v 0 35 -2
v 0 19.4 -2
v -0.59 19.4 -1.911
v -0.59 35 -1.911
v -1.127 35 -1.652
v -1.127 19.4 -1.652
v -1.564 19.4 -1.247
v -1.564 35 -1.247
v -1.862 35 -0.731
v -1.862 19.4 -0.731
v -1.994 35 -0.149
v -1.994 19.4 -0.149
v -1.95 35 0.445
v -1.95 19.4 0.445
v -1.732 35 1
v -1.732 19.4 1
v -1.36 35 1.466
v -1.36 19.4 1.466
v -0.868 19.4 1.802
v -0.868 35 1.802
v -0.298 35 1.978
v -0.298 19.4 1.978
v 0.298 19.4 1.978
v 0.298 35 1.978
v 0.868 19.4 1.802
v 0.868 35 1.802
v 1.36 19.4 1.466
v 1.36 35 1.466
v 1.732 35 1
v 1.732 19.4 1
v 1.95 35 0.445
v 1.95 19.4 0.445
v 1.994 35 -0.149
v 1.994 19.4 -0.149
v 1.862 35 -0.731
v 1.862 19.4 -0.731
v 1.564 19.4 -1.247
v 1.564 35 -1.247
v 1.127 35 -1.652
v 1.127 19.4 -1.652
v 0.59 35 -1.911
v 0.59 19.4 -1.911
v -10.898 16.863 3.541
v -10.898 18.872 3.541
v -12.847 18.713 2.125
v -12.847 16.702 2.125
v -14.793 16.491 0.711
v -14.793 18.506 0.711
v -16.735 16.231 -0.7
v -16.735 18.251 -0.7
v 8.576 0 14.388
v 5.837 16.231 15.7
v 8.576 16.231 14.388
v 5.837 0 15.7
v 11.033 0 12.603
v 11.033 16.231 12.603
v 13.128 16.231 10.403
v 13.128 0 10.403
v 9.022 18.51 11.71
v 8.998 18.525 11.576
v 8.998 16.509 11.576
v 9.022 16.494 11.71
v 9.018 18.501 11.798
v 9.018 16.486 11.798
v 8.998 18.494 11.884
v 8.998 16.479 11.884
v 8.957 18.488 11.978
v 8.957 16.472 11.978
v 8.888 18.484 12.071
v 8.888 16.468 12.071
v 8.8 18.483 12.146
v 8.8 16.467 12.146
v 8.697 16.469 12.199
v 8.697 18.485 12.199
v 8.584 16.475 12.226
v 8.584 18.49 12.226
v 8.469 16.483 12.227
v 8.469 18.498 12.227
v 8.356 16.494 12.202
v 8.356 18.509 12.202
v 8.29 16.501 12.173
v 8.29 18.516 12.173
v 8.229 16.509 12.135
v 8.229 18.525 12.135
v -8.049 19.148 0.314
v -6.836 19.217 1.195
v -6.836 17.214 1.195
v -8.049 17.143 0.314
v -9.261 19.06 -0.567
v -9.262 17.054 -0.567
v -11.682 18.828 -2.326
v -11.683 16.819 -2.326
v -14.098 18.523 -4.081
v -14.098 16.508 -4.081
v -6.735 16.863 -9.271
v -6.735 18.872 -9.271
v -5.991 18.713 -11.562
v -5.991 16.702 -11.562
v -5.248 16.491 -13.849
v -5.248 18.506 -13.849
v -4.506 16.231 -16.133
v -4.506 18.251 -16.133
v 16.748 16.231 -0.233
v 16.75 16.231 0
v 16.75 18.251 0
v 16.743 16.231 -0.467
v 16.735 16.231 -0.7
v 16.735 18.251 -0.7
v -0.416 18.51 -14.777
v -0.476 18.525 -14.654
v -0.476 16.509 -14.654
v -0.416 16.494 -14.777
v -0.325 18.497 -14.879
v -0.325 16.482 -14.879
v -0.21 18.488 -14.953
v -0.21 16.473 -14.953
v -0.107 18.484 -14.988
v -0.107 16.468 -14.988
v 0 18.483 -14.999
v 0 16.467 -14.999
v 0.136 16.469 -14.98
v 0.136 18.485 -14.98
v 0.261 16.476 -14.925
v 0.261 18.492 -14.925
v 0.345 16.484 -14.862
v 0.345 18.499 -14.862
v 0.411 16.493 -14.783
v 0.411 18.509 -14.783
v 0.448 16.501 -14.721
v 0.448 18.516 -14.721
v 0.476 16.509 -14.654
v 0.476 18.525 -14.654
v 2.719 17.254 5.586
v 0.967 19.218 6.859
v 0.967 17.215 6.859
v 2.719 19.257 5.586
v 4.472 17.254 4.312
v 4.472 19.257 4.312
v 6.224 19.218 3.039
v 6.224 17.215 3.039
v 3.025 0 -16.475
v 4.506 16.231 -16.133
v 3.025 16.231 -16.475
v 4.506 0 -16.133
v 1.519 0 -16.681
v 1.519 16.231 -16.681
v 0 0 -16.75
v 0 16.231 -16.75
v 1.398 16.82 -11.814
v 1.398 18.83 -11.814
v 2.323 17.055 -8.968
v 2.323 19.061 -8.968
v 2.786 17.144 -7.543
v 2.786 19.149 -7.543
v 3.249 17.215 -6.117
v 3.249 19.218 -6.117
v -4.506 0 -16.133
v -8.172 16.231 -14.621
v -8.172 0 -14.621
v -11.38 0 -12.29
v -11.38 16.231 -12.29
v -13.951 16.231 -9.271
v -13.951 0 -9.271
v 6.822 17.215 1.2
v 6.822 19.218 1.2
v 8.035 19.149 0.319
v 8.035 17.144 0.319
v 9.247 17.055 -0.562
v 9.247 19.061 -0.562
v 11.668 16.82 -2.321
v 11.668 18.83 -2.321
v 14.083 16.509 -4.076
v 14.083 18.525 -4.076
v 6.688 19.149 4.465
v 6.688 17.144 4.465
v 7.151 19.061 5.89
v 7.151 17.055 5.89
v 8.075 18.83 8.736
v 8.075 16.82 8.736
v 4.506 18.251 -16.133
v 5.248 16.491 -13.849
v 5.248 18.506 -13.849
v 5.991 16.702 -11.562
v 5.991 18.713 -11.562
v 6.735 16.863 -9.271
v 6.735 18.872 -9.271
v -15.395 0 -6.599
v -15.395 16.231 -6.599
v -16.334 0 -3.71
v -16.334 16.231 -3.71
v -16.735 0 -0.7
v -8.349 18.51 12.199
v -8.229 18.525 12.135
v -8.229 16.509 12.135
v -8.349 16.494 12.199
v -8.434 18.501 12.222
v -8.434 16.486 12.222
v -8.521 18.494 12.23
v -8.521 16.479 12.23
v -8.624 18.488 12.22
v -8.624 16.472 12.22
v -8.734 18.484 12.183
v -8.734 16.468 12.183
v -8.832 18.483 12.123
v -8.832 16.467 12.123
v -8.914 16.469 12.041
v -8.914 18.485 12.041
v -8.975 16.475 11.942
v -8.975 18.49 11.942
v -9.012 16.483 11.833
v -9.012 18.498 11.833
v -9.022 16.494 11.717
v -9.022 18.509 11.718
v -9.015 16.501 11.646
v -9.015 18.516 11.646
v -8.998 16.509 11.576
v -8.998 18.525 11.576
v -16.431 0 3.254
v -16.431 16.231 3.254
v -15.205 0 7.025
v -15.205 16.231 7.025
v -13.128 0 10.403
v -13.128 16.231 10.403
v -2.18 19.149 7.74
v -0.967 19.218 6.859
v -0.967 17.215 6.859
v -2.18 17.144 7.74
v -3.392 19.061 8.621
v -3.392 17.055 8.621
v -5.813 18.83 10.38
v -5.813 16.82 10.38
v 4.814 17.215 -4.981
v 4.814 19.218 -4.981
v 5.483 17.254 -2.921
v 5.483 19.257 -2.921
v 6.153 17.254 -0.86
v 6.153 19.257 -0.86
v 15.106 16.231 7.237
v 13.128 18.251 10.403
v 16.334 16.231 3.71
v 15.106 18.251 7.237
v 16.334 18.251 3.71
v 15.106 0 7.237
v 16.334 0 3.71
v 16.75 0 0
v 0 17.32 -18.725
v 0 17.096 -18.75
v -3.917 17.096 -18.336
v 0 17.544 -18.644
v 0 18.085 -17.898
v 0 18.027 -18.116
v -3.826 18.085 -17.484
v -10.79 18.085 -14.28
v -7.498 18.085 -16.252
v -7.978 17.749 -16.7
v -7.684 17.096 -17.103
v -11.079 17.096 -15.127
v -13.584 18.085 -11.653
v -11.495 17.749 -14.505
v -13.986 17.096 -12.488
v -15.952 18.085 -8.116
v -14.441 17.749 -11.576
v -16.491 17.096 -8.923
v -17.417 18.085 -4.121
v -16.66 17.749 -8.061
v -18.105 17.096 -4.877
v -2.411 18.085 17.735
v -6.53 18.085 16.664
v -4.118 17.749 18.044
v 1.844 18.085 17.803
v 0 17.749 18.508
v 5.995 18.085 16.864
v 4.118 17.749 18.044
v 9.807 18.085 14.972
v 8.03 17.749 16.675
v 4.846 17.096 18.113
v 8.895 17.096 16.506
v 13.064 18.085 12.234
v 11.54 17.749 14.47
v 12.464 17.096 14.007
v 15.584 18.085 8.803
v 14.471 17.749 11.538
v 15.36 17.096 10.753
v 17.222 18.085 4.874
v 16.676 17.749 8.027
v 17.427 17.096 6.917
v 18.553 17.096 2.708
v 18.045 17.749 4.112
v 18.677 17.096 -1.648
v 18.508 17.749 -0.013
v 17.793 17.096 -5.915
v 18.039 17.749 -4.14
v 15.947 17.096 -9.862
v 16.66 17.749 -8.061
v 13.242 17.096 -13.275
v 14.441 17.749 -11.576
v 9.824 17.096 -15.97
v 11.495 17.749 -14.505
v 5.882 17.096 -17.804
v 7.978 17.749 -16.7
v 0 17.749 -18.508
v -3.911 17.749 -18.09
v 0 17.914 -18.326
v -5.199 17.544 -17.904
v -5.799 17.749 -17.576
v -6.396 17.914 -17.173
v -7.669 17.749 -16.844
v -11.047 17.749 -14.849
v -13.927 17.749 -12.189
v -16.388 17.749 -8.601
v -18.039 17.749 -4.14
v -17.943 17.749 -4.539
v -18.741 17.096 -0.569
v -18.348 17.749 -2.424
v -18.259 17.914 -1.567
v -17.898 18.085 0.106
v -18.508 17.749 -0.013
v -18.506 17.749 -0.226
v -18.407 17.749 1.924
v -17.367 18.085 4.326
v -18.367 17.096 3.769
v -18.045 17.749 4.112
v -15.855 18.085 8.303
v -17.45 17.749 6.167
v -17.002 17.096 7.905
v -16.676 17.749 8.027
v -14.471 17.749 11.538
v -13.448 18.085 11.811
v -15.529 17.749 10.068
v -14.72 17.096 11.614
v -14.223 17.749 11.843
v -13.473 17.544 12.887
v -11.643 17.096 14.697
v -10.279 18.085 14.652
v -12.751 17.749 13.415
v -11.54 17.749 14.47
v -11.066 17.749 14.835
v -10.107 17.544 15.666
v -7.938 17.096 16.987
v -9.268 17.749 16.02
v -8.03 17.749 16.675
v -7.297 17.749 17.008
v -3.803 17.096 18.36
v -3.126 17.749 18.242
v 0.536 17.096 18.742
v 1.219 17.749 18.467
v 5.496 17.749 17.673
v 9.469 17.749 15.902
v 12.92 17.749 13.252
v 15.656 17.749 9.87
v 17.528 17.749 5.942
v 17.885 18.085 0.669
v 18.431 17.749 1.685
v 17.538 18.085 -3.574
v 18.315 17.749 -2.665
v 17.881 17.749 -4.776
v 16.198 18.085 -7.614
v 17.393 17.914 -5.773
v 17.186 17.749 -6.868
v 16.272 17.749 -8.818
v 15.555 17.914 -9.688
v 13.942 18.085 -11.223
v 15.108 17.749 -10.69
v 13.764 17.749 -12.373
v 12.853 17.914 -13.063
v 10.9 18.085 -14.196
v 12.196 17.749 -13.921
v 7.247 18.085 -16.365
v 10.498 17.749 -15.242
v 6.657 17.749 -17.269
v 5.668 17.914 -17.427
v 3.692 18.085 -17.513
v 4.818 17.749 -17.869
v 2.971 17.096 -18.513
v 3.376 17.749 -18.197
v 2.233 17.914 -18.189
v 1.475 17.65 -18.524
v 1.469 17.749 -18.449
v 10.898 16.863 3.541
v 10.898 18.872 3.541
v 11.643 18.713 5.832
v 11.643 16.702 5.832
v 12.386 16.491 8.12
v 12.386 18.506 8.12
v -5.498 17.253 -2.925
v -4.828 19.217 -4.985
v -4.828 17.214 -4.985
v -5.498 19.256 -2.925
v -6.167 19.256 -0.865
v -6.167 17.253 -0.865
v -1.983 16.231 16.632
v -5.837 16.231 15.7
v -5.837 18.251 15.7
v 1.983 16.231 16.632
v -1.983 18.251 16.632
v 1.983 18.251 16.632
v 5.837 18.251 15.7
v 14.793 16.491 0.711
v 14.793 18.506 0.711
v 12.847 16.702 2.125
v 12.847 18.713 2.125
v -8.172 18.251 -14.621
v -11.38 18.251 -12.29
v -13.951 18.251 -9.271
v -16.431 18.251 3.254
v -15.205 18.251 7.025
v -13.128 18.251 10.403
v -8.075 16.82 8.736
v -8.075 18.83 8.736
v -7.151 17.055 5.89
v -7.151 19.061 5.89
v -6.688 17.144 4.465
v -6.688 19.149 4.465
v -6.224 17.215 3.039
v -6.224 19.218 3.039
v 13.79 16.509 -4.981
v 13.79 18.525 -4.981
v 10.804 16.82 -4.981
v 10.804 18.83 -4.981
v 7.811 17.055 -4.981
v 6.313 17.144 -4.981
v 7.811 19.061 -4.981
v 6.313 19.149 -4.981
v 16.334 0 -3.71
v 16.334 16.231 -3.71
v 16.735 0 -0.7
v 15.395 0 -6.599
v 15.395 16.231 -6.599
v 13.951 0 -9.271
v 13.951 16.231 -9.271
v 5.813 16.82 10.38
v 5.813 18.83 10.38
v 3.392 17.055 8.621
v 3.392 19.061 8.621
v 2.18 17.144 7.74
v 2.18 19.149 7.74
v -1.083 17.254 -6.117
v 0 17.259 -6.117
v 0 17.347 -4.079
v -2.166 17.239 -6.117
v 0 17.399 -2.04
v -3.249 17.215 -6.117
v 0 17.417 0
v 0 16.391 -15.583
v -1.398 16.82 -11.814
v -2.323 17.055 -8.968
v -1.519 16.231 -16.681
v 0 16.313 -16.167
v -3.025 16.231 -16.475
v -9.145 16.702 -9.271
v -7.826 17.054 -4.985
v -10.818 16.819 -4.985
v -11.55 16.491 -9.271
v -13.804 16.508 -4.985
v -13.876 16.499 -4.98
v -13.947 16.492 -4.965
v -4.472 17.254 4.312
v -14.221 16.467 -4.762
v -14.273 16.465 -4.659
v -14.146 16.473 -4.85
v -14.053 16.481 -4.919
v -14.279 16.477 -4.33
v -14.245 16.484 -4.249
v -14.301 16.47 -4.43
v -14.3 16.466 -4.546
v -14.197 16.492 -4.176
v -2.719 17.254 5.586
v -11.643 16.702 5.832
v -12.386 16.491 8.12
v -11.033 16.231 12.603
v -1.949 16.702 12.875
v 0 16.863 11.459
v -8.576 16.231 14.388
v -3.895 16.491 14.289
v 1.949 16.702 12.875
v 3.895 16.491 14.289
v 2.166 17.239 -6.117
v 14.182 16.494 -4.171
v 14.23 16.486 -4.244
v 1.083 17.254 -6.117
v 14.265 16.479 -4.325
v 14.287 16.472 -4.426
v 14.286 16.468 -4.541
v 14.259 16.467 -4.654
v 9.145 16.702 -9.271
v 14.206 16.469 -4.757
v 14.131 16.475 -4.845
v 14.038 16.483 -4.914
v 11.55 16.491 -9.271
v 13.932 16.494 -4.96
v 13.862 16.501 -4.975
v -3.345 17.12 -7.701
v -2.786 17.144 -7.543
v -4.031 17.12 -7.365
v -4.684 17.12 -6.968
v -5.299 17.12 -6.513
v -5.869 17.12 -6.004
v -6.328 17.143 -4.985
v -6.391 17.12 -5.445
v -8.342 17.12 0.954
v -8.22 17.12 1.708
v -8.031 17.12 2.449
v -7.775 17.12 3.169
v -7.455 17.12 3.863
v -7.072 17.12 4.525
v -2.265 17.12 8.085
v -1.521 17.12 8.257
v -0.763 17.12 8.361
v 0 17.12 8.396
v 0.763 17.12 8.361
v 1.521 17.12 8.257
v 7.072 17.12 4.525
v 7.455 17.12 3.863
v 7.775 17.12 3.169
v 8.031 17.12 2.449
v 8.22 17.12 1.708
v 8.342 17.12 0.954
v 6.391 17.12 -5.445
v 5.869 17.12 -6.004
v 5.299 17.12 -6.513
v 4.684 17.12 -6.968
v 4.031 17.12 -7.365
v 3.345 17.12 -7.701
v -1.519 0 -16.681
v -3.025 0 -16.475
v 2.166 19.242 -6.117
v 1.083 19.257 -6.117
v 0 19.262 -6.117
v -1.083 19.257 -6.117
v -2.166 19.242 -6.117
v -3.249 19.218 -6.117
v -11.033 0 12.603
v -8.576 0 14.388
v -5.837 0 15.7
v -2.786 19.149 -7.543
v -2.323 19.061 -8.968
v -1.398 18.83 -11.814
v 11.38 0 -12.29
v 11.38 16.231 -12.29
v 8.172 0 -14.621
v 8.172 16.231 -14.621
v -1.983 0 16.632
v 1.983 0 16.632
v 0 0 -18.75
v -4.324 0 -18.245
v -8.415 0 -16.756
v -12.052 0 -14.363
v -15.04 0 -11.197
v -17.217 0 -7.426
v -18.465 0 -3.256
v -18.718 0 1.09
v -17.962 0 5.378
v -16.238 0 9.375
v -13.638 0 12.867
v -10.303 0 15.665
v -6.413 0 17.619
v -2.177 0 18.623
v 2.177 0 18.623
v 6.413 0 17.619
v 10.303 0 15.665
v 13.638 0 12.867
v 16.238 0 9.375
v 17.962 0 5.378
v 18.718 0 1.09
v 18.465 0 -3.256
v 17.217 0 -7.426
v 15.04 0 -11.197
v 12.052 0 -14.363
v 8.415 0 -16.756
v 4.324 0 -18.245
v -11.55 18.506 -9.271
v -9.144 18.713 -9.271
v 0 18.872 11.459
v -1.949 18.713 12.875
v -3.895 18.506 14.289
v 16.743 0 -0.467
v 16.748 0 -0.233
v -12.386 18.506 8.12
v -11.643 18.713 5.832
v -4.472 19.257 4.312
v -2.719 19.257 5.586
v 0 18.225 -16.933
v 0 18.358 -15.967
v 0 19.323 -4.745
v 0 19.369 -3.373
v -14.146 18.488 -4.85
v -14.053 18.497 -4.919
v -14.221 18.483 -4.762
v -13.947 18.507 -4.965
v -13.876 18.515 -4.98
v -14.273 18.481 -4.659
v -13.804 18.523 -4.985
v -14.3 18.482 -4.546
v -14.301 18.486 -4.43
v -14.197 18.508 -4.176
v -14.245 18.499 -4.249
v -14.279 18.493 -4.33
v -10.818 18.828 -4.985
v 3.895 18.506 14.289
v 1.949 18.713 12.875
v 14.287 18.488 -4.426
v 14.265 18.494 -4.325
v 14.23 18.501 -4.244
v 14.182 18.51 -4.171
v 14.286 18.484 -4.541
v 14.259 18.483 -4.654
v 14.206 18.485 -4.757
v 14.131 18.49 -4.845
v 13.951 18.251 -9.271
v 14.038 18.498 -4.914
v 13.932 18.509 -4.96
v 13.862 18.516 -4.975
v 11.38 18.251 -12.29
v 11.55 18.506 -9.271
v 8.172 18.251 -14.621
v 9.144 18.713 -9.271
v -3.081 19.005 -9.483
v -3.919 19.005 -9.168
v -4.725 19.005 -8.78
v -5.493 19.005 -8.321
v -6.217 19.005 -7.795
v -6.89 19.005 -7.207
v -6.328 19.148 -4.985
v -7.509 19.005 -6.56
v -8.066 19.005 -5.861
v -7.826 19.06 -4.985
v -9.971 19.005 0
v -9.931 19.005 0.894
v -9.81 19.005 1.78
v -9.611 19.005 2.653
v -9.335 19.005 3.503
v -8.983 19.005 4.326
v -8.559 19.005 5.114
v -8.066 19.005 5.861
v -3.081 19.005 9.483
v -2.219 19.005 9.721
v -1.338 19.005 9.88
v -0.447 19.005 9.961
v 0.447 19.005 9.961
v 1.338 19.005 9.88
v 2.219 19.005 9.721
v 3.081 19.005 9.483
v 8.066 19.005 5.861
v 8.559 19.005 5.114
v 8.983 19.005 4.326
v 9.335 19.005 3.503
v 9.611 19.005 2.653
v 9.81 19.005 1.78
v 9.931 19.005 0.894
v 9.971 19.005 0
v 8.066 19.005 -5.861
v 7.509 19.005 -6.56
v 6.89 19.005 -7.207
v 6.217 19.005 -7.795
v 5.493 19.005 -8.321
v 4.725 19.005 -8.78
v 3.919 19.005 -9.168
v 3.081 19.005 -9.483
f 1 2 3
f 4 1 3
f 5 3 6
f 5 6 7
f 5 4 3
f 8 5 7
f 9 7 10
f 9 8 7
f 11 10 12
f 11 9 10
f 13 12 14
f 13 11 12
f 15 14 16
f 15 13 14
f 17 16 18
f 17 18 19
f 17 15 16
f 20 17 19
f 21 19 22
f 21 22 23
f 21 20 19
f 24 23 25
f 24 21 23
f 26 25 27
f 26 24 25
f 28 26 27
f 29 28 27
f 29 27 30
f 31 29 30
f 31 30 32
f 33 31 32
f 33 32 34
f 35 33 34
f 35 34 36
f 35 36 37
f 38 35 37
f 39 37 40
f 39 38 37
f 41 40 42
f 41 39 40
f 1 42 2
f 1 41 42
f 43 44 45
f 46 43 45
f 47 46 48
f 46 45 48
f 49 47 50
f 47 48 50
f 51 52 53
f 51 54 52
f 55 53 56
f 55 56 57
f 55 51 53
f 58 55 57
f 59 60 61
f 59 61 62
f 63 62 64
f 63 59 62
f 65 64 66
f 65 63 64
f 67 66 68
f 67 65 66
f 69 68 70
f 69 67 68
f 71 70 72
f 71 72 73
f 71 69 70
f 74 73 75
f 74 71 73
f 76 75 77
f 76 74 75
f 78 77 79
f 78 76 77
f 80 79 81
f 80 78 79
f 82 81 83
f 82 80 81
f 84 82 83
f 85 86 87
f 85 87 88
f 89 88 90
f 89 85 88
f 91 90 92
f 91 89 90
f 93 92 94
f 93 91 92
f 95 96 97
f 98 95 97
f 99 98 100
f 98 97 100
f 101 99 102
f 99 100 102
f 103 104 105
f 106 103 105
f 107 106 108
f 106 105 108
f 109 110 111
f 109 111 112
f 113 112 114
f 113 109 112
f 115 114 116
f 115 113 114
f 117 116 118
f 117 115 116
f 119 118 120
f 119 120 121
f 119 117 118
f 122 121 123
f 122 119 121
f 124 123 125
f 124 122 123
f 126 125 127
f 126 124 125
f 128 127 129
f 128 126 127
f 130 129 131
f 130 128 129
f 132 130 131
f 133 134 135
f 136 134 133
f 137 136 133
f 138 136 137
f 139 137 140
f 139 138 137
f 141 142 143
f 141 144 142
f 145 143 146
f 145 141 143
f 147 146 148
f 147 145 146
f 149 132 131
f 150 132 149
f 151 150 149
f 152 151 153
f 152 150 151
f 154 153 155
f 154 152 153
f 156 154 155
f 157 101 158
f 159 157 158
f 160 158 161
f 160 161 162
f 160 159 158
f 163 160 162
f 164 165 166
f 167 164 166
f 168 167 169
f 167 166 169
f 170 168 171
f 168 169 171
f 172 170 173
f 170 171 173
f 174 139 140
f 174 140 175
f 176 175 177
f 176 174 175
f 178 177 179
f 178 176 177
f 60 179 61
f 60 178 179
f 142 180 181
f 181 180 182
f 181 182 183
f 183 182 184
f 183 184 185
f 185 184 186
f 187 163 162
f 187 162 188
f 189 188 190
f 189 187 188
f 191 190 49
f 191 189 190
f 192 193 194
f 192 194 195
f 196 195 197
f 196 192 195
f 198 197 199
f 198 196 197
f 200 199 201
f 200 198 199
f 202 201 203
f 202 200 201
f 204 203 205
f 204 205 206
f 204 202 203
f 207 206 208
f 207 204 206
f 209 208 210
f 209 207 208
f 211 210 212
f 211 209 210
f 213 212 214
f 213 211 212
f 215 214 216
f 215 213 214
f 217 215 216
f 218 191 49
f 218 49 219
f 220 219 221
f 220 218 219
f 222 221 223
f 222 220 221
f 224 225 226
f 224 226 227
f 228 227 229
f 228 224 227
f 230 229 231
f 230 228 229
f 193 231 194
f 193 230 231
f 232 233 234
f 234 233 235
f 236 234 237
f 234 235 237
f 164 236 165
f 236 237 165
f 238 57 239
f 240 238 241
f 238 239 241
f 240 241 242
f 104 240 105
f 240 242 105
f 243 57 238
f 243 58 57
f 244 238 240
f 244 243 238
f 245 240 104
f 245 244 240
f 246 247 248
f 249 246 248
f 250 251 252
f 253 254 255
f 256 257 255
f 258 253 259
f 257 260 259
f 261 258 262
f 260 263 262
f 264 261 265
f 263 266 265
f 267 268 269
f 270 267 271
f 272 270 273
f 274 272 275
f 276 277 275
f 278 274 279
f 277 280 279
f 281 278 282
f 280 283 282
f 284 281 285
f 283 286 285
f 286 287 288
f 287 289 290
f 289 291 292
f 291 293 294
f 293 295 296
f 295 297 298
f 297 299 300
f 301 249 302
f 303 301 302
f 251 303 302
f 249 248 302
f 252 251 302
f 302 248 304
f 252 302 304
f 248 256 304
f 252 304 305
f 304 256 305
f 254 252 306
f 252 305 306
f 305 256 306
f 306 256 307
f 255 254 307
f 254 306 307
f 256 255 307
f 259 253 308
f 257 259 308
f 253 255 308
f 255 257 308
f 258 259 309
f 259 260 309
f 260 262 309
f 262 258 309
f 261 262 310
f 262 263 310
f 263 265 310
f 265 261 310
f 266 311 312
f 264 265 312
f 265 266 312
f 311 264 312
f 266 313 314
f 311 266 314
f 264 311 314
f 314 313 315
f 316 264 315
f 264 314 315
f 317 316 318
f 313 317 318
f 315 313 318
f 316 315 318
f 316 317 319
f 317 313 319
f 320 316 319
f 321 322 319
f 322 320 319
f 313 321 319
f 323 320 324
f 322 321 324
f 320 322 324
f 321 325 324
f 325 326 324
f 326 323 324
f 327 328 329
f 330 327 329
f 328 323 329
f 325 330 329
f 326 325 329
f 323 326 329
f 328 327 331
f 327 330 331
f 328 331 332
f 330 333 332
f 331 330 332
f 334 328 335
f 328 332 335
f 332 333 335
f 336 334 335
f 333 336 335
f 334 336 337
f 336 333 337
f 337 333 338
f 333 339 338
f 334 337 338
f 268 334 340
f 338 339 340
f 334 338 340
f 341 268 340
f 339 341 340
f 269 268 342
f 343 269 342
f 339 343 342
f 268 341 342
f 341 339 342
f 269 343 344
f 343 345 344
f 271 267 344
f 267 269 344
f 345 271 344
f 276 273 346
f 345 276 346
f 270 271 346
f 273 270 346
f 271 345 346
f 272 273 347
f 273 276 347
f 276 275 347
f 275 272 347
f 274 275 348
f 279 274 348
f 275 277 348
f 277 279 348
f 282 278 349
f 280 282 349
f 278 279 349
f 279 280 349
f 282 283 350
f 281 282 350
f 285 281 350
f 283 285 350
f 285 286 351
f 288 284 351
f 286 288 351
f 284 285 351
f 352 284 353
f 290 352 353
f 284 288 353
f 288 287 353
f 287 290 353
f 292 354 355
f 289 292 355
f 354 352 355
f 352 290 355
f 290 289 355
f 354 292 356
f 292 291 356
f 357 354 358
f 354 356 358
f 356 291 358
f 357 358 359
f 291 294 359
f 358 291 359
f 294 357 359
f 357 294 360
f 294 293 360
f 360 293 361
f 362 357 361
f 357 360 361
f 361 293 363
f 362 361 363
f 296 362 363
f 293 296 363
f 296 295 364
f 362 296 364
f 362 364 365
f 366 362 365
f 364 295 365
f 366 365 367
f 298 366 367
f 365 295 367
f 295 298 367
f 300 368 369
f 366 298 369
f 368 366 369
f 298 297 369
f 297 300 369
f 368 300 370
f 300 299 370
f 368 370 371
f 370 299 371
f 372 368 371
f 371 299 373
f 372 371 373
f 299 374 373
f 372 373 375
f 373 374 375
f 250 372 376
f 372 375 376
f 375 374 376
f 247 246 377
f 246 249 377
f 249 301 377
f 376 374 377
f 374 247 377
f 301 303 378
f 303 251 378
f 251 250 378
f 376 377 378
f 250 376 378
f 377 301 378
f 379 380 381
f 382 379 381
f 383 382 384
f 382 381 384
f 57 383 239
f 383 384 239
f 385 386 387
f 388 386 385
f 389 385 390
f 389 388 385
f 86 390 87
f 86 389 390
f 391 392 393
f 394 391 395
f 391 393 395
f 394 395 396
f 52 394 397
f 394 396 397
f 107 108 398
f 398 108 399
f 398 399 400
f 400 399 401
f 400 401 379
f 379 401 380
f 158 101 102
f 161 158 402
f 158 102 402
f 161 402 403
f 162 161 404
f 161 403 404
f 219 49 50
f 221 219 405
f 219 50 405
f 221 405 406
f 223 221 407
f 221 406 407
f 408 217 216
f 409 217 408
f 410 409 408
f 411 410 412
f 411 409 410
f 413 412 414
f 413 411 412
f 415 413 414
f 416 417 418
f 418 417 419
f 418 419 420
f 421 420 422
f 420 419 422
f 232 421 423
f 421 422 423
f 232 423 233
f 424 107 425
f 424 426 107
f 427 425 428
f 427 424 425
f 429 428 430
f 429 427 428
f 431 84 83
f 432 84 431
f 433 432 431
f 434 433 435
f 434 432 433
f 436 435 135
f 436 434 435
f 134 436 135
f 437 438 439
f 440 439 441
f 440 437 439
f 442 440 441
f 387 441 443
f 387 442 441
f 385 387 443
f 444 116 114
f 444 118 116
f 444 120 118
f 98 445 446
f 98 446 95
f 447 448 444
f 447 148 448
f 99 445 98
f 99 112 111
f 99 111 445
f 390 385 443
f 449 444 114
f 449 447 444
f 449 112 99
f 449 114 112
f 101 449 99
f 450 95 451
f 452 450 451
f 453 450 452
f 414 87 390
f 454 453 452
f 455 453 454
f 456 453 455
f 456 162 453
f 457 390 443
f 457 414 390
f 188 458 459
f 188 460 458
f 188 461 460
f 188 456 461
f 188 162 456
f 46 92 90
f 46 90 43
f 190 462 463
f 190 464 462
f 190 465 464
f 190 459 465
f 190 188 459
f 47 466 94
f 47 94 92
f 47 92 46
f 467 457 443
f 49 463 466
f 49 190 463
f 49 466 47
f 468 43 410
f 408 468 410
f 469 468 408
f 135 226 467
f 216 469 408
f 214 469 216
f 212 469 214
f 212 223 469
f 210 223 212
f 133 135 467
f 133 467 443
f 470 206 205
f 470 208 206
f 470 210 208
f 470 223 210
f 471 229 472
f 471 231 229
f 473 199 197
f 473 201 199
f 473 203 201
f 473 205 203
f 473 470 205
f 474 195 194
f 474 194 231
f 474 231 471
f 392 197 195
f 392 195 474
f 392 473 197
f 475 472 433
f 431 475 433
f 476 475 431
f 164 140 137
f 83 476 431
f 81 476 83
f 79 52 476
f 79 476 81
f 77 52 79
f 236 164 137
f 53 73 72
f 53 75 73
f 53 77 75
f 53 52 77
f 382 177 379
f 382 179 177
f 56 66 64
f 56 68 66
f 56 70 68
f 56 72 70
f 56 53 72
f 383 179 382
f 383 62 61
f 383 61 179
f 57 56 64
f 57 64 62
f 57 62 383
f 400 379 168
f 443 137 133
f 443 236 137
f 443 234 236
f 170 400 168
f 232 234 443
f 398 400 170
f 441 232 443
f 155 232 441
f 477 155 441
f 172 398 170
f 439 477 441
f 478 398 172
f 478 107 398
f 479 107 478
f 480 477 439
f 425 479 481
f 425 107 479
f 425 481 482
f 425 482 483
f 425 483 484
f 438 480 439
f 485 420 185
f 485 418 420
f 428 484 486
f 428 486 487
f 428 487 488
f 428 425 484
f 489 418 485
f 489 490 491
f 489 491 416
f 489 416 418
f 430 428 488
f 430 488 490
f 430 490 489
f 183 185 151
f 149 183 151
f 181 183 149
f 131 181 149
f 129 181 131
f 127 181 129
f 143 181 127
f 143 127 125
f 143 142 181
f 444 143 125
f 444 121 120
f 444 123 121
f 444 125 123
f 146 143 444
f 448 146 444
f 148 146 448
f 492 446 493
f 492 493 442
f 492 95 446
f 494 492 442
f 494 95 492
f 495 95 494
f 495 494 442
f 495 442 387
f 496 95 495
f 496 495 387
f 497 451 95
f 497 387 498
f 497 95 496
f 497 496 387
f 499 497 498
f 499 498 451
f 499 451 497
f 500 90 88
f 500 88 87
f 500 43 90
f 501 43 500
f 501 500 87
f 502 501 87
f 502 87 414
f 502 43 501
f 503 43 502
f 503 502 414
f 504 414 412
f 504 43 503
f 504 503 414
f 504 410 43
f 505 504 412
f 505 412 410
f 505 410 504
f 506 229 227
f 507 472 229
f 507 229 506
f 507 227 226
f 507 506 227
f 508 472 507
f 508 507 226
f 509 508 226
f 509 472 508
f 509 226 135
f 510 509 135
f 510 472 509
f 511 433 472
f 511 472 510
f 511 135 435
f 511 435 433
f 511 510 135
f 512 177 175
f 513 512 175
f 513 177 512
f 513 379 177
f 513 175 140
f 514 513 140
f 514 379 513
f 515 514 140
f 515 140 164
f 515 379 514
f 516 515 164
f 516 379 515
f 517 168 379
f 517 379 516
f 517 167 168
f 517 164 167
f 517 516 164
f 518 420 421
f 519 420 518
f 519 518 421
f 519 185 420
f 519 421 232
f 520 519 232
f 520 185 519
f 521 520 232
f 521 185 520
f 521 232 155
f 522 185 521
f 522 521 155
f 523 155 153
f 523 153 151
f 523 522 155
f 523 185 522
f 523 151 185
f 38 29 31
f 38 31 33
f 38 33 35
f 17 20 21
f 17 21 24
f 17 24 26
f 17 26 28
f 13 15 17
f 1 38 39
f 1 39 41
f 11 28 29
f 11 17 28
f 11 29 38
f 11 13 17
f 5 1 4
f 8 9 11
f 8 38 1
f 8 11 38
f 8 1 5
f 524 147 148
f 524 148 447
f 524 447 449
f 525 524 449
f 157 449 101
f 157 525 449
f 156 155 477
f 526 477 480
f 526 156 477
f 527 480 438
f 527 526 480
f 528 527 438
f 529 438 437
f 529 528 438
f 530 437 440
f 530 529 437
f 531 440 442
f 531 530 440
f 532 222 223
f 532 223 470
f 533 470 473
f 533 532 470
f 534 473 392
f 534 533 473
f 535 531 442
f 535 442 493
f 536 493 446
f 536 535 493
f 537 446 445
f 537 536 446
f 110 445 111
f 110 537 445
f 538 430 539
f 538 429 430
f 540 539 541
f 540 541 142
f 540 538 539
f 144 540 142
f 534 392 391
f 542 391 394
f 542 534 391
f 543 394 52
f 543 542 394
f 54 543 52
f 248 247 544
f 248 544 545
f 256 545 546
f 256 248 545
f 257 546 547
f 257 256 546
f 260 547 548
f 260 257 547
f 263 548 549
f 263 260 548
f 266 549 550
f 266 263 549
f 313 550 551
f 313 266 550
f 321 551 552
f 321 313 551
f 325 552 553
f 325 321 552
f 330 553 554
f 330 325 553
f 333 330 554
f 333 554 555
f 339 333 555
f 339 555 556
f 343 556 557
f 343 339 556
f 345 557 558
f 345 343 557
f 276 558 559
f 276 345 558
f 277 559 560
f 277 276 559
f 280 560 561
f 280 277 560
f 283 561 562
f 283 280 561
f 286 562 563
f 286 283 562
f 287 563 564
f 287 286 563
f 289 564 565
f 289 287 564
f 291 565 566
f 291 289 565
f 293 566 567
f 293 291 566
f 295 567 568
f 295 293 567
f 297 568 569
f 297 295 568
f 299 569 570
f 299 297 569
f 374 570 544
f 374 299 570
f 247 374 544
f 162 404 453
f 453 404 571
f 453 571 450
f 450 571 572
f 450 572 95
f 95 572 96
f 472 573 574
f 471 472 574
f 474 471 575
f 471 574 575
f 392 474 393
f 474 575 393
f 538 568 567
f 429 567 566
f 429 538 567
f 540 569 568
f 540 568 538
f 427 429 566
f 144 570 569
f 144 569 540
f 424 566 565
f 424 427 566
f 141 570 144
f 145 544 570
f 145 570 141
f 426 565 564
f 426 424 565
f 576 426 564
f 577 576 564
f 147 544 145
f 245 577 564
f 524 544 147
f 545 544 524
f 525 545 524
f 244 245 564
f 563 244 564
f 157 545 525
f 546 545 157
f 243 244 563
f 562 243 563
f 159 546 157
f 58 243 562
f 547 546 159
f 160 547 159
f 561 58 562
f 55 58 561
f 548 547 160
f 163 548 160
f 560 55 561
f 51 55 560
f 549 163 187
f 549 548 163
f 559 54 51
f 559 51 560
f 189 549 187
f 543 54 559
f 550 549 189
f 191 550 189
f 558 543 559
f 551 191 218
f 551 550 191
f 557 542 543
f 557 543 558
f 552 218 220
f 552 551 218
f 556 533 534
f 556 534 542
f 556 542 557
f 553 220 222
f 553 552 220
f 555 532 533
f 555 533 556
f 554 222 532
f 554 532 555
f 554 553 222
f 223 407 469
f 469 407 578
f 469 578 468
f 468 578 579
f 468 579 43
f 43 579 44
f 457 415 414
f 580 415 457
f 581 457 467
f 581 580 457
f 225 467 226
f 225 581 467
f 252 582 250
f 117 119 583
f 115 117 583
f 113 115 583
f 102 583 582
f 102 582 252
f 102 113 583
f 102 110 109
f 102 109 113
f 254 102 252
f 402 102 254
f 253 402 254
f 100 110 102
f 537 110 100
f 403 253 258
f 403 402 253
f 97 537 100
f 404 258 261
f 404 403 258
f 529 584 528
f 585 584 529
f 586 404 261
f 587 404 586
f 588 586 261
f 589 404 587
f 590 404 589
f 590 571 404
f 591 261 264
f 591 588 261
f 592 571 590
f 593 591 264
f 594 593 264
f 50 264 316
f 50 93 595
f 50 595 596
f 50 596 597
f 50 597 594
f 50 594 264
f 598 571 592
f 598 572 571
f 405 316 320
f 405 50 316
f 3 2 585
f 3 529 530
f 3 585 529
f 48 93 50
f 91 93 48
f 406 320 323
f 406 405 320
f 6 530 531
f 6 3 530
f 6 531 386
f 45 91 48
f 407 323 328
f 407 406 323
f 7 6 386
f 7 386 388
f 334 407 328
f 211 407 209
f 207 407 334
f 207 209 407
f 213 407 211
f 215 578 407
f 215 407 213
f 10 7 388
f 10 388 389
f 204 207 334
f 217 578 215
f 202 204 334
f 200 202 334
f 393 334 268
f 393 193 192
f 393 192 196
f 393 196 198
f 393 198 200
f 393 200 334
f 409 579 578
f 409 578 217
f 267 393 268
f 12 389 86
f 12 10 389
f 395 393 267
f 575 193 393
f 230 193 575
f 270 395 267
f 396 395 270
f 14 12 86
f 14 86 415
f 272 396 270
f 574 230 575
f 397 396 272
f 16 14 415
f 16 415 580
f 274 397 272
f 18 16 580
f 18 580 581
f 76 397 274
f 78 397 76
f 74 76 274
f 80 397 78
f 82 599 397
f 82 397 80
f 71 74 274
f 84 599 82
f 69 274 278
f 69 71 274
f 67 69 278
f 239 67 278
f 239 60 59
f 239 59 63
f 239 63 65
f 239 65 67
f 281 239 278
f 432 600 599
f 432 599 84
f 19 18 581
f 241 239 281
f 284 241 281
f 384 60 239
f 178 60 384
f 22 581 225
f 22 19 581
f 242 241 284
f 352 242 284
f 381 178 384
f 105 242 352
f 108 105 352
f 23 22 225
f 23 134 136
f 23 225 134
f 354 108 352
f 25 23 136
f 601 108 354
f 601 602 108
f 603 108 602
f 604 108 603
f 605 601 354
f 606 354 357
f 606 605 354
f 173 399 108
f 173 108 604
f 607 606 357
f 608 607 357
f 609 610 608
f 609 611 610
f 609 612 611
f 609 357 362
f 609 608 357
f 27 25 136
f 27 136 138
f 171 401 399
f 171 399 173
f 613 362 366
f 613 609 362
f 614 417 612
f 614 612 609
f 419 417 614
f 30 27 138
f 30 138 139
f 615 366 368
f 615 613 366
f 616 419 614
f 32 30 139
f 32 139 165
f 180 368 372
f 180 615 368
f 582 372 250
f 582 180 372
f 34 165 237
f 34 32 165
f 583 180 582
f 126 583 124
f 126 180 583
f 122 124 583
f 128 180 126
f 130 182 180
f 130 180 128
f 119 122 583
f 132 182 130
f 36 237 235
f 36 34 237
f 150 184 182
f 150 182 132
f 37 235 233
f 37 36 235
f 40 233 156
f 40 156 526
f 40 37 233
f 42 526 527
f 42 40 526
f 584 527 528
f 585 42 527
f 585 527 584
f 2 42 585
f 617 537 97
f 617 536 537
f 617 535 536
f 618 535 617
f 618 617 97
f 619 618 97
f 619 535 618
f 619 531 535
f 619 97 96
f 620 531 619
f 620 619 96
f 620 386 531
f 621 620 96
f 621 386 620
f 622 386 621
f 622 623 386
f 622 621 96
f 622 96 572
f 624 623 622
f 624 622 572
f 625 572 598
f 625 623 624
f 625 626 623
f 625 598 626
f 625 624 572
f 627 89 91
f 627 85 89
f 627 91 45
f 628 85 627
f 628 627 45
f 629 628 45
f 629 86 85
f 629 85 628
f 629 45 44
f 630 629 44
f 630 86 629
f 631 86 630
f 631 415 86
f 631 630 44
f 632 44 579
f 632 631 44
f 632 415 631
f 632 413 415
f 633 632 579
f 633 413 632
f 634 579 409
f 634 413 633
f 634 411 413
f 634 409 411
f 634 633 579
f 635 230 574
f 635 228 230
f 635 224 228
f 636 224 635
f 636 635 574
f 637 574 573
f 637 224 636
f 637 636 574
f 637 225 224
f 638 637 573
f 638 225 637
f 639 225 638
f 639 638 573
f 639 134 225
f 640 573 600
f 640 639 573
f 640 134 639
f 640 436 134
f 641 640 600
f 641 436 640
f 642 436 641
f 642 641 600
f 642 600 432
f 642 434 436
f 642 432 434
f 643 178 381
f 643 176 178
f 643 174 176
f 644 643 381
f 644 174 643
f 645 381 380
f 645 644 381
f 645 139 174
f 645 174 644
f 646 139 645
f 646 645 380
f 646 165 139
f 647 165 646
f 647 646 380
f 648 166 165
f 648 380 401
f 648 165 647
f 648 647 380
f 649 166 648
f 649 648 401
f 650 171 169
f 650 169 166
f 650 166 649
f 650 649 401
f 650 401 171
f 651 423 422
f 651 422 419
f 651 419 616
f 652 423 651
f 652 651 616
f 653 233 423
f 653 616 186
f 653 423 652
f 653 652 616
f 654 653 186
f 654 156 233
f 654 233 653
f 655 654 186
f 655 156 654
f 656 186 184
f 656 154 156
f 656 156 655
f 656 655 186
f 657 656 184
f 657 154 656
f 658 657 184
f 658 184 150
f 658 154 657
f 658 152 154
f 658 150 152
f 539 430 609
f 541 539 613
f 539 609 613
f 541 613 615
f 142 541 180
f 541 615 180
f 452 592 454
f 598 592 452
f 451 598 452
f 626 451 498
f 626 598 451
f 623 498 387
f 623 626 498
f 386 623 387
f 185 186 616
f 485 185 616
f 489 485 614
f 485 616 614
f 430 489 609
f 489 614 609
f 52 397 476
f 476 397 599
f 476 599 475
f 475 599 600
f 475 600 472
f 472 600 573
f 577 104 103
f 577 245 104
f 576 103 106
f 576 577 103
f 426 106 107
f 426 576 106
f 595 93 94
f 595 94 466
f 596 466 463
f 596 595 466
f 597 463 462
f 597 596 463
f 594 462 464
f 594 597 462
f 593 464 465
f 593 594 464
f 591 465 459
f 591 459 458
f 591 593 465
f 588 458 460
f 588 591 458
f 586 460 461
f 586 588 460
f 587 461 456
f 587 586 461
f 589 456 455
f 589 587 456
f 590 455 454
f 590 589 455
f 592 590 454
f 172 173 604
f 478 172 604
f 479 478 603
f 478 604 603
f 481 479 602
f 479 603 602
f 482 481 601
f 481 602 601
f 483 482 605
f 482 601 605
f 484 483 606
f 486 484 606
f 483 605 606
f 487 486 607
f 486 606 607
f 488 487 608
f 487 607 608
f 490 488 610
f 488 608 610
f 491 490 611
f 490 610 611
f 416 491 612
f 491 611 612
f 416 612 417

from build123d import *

# Parameters (mm, degrees)
CUT_EXTRUDE3_DEPTH = 44.91042
CUT_EXTRUDE7_DEPTH = 44.91042
FILLET1_R          = 1


with BuildPart() as part:
    # Sketch1 → Revolve1 (revolve)
    with BuildSketch(Plane.XY):
        with BuildLine():
            Line((-18.75, 0), (-18.75, 17.954213))
            ThreePointArc((-18.75, 17.954213), (-10.400154, 18.968524), (-2, 19.4))
            Line((-2, 19.4), (-2, 35))
            Line((-2, 35), (0, 35))
            Line((0, 35), (0, 17.416539))
            ThreePointArc((0, 17.416539), (-8.395945, 17.119829), (-16.75, 16.231181))
            Line((-16.75, 16.231181), (-16.75, 0))
            Line((-16.75, 0), (-18.75, 0))
        make_face()
    revolve(axis=Axis((0, -0.123973, 0), (0, 1, 0)))

    # Sketch2 → Cut-Extrude3 (cut, through all)
    with BuildSketch(Plane(origin=(0, 35, 0), x_dir=(1, 0, 0), z_dir=(0, 1, 0))):
        with BuildLine():
            ThreePointArc((-16.735368, 0.699976), (-15.930197, -5.176035), (-13.127761, -10.403095))
            Line((-13.127761, -10.403095), (-10.898138, -3.54102))
            Line((-10.898138, -3.54102), (-16.735368, 0.699976))
        make_face()
        with BuildLine():
            Line((0, -11.45898), (-5.83723, -15.699976))
            ThreePointArc((-5.83723, -15.699976), (0, -16.75), (5.83723, -15.699976))
            Line((5.83723, -15.699976), (0, -11.45898))
        make_face()
        with BuildLine():
            Line((-13.950633, 9.27051), (-6.73542, 9.27051))
            Line((-6.73542, 9.27051), (-4.505796, 16.132585))
            ThreePointArc((-4.505796, 16.132585), (-9.845403, 13.551035), (-13.950633, 9.27051))
        make_face()
        with BuildLine():
            Line((16.735368, 0.699976), (10.898138, -3.54102))
            Line((10.898138, -3.54102), (13.127761, -10.403095))
            ThreePointArc((13.127761, -10.403095), (15.930197, -5.176035), (16.735368, 0.699976))
        make_face()
        with BuildLine():
            Line((4.505796, 16.132585), (6.73542, 9.27051))
            Line((6.73542, 9.27051), (13.950633, 9.27051))
            ThreePointArc((13.950633, 9.27051), (9.845403, 13.551035), (4.505796, 16.132585))
        make_face()
    extrude(amount=-CUT_EXTRUDE3_DEPTH, mode=Mode.SUBTRACT)

    # Sketch3 → Cut-Extrude7 (cut, through all)
    with BuildSketch(Plane(origin=(0, 35, 0), x_dir=(1, 0, 0), z_dir=(0, 1, 0))):
        with BuildLine():
            ThreePointArc((-13.804158, 4.985243), (-14.279687, 4.639751), (-14.098051, 4.080734))
            Line((-14.098051, 4.080734), (-6.836492, -1.195097))
            Line((-6.836492, -1.195097), (-4.828378, 4.985243))
            Line((-4.828378, 4.985243), (-13.804158, 4.985243))
        make_face()
        with BuildLine():
            ThreePointArc((0.475528, 14.653743), (0, 14.999234), (-0.475528, 14.653743))
            Line((-0.475528, 14.653743), (-3.249197, 6.117268))
            Line((-3.249197, 6.117268), (3.249197, 6.117268))
            Line((3.249197, 6.117268), (0.475528, 14.653743))
        make_face()
        with BuildLine():
            Line((13.789591, 4.98051), (4.813811, 4.98051))
            Line((4.813811, 4.98051), (6.821925, -1.19983))
            Line((6.821925, -1.19983), (14.083484, 4.076001))
            ThreePointArc((14.083484, 4.076001), (14.26512, 4.635018), (13.789591, 4.98051))
        make_face()
        with BuildLine():
            Line((6.224296, -3.039144), (0.966985, -6.858804))
            Line((0.966985, -6.858804), (8.228544, -12.134636))
            ThreePointArc((8.228544, -12.134636), (8.816329, -12.134636), (8.997964, -11.575619))
            Line((8.997964, -11.575619), (6.224296, -3.039144))
        make_face()
        with BuildLine():
            Line((-0.966985, -6.858804), (-6.224296, -3.039144))
            Line((-6.224296, -3.039144), (-8.997964, -11.575619))
            ThreePointArc((-8.997964, -11.575619), (-8.816329, -12.134636), (-8.228544, -12.134636))
            Line((-8.228544, -12.134636), (-0.966985, -6.858804))
        make_face()
    extrude(amount=-CUT_EXTRUDE7_DEPTH, mode=Mode.SUBTRACT)

    # Fillet1
    fillet1_edges = [part.edges().sort_by_distance(p)[0] for p in [
        (18.75, 17.954213, 0),
    ]]
    fillet(fillet1_edges, radius=FILLET1_R)


solid = part.part
